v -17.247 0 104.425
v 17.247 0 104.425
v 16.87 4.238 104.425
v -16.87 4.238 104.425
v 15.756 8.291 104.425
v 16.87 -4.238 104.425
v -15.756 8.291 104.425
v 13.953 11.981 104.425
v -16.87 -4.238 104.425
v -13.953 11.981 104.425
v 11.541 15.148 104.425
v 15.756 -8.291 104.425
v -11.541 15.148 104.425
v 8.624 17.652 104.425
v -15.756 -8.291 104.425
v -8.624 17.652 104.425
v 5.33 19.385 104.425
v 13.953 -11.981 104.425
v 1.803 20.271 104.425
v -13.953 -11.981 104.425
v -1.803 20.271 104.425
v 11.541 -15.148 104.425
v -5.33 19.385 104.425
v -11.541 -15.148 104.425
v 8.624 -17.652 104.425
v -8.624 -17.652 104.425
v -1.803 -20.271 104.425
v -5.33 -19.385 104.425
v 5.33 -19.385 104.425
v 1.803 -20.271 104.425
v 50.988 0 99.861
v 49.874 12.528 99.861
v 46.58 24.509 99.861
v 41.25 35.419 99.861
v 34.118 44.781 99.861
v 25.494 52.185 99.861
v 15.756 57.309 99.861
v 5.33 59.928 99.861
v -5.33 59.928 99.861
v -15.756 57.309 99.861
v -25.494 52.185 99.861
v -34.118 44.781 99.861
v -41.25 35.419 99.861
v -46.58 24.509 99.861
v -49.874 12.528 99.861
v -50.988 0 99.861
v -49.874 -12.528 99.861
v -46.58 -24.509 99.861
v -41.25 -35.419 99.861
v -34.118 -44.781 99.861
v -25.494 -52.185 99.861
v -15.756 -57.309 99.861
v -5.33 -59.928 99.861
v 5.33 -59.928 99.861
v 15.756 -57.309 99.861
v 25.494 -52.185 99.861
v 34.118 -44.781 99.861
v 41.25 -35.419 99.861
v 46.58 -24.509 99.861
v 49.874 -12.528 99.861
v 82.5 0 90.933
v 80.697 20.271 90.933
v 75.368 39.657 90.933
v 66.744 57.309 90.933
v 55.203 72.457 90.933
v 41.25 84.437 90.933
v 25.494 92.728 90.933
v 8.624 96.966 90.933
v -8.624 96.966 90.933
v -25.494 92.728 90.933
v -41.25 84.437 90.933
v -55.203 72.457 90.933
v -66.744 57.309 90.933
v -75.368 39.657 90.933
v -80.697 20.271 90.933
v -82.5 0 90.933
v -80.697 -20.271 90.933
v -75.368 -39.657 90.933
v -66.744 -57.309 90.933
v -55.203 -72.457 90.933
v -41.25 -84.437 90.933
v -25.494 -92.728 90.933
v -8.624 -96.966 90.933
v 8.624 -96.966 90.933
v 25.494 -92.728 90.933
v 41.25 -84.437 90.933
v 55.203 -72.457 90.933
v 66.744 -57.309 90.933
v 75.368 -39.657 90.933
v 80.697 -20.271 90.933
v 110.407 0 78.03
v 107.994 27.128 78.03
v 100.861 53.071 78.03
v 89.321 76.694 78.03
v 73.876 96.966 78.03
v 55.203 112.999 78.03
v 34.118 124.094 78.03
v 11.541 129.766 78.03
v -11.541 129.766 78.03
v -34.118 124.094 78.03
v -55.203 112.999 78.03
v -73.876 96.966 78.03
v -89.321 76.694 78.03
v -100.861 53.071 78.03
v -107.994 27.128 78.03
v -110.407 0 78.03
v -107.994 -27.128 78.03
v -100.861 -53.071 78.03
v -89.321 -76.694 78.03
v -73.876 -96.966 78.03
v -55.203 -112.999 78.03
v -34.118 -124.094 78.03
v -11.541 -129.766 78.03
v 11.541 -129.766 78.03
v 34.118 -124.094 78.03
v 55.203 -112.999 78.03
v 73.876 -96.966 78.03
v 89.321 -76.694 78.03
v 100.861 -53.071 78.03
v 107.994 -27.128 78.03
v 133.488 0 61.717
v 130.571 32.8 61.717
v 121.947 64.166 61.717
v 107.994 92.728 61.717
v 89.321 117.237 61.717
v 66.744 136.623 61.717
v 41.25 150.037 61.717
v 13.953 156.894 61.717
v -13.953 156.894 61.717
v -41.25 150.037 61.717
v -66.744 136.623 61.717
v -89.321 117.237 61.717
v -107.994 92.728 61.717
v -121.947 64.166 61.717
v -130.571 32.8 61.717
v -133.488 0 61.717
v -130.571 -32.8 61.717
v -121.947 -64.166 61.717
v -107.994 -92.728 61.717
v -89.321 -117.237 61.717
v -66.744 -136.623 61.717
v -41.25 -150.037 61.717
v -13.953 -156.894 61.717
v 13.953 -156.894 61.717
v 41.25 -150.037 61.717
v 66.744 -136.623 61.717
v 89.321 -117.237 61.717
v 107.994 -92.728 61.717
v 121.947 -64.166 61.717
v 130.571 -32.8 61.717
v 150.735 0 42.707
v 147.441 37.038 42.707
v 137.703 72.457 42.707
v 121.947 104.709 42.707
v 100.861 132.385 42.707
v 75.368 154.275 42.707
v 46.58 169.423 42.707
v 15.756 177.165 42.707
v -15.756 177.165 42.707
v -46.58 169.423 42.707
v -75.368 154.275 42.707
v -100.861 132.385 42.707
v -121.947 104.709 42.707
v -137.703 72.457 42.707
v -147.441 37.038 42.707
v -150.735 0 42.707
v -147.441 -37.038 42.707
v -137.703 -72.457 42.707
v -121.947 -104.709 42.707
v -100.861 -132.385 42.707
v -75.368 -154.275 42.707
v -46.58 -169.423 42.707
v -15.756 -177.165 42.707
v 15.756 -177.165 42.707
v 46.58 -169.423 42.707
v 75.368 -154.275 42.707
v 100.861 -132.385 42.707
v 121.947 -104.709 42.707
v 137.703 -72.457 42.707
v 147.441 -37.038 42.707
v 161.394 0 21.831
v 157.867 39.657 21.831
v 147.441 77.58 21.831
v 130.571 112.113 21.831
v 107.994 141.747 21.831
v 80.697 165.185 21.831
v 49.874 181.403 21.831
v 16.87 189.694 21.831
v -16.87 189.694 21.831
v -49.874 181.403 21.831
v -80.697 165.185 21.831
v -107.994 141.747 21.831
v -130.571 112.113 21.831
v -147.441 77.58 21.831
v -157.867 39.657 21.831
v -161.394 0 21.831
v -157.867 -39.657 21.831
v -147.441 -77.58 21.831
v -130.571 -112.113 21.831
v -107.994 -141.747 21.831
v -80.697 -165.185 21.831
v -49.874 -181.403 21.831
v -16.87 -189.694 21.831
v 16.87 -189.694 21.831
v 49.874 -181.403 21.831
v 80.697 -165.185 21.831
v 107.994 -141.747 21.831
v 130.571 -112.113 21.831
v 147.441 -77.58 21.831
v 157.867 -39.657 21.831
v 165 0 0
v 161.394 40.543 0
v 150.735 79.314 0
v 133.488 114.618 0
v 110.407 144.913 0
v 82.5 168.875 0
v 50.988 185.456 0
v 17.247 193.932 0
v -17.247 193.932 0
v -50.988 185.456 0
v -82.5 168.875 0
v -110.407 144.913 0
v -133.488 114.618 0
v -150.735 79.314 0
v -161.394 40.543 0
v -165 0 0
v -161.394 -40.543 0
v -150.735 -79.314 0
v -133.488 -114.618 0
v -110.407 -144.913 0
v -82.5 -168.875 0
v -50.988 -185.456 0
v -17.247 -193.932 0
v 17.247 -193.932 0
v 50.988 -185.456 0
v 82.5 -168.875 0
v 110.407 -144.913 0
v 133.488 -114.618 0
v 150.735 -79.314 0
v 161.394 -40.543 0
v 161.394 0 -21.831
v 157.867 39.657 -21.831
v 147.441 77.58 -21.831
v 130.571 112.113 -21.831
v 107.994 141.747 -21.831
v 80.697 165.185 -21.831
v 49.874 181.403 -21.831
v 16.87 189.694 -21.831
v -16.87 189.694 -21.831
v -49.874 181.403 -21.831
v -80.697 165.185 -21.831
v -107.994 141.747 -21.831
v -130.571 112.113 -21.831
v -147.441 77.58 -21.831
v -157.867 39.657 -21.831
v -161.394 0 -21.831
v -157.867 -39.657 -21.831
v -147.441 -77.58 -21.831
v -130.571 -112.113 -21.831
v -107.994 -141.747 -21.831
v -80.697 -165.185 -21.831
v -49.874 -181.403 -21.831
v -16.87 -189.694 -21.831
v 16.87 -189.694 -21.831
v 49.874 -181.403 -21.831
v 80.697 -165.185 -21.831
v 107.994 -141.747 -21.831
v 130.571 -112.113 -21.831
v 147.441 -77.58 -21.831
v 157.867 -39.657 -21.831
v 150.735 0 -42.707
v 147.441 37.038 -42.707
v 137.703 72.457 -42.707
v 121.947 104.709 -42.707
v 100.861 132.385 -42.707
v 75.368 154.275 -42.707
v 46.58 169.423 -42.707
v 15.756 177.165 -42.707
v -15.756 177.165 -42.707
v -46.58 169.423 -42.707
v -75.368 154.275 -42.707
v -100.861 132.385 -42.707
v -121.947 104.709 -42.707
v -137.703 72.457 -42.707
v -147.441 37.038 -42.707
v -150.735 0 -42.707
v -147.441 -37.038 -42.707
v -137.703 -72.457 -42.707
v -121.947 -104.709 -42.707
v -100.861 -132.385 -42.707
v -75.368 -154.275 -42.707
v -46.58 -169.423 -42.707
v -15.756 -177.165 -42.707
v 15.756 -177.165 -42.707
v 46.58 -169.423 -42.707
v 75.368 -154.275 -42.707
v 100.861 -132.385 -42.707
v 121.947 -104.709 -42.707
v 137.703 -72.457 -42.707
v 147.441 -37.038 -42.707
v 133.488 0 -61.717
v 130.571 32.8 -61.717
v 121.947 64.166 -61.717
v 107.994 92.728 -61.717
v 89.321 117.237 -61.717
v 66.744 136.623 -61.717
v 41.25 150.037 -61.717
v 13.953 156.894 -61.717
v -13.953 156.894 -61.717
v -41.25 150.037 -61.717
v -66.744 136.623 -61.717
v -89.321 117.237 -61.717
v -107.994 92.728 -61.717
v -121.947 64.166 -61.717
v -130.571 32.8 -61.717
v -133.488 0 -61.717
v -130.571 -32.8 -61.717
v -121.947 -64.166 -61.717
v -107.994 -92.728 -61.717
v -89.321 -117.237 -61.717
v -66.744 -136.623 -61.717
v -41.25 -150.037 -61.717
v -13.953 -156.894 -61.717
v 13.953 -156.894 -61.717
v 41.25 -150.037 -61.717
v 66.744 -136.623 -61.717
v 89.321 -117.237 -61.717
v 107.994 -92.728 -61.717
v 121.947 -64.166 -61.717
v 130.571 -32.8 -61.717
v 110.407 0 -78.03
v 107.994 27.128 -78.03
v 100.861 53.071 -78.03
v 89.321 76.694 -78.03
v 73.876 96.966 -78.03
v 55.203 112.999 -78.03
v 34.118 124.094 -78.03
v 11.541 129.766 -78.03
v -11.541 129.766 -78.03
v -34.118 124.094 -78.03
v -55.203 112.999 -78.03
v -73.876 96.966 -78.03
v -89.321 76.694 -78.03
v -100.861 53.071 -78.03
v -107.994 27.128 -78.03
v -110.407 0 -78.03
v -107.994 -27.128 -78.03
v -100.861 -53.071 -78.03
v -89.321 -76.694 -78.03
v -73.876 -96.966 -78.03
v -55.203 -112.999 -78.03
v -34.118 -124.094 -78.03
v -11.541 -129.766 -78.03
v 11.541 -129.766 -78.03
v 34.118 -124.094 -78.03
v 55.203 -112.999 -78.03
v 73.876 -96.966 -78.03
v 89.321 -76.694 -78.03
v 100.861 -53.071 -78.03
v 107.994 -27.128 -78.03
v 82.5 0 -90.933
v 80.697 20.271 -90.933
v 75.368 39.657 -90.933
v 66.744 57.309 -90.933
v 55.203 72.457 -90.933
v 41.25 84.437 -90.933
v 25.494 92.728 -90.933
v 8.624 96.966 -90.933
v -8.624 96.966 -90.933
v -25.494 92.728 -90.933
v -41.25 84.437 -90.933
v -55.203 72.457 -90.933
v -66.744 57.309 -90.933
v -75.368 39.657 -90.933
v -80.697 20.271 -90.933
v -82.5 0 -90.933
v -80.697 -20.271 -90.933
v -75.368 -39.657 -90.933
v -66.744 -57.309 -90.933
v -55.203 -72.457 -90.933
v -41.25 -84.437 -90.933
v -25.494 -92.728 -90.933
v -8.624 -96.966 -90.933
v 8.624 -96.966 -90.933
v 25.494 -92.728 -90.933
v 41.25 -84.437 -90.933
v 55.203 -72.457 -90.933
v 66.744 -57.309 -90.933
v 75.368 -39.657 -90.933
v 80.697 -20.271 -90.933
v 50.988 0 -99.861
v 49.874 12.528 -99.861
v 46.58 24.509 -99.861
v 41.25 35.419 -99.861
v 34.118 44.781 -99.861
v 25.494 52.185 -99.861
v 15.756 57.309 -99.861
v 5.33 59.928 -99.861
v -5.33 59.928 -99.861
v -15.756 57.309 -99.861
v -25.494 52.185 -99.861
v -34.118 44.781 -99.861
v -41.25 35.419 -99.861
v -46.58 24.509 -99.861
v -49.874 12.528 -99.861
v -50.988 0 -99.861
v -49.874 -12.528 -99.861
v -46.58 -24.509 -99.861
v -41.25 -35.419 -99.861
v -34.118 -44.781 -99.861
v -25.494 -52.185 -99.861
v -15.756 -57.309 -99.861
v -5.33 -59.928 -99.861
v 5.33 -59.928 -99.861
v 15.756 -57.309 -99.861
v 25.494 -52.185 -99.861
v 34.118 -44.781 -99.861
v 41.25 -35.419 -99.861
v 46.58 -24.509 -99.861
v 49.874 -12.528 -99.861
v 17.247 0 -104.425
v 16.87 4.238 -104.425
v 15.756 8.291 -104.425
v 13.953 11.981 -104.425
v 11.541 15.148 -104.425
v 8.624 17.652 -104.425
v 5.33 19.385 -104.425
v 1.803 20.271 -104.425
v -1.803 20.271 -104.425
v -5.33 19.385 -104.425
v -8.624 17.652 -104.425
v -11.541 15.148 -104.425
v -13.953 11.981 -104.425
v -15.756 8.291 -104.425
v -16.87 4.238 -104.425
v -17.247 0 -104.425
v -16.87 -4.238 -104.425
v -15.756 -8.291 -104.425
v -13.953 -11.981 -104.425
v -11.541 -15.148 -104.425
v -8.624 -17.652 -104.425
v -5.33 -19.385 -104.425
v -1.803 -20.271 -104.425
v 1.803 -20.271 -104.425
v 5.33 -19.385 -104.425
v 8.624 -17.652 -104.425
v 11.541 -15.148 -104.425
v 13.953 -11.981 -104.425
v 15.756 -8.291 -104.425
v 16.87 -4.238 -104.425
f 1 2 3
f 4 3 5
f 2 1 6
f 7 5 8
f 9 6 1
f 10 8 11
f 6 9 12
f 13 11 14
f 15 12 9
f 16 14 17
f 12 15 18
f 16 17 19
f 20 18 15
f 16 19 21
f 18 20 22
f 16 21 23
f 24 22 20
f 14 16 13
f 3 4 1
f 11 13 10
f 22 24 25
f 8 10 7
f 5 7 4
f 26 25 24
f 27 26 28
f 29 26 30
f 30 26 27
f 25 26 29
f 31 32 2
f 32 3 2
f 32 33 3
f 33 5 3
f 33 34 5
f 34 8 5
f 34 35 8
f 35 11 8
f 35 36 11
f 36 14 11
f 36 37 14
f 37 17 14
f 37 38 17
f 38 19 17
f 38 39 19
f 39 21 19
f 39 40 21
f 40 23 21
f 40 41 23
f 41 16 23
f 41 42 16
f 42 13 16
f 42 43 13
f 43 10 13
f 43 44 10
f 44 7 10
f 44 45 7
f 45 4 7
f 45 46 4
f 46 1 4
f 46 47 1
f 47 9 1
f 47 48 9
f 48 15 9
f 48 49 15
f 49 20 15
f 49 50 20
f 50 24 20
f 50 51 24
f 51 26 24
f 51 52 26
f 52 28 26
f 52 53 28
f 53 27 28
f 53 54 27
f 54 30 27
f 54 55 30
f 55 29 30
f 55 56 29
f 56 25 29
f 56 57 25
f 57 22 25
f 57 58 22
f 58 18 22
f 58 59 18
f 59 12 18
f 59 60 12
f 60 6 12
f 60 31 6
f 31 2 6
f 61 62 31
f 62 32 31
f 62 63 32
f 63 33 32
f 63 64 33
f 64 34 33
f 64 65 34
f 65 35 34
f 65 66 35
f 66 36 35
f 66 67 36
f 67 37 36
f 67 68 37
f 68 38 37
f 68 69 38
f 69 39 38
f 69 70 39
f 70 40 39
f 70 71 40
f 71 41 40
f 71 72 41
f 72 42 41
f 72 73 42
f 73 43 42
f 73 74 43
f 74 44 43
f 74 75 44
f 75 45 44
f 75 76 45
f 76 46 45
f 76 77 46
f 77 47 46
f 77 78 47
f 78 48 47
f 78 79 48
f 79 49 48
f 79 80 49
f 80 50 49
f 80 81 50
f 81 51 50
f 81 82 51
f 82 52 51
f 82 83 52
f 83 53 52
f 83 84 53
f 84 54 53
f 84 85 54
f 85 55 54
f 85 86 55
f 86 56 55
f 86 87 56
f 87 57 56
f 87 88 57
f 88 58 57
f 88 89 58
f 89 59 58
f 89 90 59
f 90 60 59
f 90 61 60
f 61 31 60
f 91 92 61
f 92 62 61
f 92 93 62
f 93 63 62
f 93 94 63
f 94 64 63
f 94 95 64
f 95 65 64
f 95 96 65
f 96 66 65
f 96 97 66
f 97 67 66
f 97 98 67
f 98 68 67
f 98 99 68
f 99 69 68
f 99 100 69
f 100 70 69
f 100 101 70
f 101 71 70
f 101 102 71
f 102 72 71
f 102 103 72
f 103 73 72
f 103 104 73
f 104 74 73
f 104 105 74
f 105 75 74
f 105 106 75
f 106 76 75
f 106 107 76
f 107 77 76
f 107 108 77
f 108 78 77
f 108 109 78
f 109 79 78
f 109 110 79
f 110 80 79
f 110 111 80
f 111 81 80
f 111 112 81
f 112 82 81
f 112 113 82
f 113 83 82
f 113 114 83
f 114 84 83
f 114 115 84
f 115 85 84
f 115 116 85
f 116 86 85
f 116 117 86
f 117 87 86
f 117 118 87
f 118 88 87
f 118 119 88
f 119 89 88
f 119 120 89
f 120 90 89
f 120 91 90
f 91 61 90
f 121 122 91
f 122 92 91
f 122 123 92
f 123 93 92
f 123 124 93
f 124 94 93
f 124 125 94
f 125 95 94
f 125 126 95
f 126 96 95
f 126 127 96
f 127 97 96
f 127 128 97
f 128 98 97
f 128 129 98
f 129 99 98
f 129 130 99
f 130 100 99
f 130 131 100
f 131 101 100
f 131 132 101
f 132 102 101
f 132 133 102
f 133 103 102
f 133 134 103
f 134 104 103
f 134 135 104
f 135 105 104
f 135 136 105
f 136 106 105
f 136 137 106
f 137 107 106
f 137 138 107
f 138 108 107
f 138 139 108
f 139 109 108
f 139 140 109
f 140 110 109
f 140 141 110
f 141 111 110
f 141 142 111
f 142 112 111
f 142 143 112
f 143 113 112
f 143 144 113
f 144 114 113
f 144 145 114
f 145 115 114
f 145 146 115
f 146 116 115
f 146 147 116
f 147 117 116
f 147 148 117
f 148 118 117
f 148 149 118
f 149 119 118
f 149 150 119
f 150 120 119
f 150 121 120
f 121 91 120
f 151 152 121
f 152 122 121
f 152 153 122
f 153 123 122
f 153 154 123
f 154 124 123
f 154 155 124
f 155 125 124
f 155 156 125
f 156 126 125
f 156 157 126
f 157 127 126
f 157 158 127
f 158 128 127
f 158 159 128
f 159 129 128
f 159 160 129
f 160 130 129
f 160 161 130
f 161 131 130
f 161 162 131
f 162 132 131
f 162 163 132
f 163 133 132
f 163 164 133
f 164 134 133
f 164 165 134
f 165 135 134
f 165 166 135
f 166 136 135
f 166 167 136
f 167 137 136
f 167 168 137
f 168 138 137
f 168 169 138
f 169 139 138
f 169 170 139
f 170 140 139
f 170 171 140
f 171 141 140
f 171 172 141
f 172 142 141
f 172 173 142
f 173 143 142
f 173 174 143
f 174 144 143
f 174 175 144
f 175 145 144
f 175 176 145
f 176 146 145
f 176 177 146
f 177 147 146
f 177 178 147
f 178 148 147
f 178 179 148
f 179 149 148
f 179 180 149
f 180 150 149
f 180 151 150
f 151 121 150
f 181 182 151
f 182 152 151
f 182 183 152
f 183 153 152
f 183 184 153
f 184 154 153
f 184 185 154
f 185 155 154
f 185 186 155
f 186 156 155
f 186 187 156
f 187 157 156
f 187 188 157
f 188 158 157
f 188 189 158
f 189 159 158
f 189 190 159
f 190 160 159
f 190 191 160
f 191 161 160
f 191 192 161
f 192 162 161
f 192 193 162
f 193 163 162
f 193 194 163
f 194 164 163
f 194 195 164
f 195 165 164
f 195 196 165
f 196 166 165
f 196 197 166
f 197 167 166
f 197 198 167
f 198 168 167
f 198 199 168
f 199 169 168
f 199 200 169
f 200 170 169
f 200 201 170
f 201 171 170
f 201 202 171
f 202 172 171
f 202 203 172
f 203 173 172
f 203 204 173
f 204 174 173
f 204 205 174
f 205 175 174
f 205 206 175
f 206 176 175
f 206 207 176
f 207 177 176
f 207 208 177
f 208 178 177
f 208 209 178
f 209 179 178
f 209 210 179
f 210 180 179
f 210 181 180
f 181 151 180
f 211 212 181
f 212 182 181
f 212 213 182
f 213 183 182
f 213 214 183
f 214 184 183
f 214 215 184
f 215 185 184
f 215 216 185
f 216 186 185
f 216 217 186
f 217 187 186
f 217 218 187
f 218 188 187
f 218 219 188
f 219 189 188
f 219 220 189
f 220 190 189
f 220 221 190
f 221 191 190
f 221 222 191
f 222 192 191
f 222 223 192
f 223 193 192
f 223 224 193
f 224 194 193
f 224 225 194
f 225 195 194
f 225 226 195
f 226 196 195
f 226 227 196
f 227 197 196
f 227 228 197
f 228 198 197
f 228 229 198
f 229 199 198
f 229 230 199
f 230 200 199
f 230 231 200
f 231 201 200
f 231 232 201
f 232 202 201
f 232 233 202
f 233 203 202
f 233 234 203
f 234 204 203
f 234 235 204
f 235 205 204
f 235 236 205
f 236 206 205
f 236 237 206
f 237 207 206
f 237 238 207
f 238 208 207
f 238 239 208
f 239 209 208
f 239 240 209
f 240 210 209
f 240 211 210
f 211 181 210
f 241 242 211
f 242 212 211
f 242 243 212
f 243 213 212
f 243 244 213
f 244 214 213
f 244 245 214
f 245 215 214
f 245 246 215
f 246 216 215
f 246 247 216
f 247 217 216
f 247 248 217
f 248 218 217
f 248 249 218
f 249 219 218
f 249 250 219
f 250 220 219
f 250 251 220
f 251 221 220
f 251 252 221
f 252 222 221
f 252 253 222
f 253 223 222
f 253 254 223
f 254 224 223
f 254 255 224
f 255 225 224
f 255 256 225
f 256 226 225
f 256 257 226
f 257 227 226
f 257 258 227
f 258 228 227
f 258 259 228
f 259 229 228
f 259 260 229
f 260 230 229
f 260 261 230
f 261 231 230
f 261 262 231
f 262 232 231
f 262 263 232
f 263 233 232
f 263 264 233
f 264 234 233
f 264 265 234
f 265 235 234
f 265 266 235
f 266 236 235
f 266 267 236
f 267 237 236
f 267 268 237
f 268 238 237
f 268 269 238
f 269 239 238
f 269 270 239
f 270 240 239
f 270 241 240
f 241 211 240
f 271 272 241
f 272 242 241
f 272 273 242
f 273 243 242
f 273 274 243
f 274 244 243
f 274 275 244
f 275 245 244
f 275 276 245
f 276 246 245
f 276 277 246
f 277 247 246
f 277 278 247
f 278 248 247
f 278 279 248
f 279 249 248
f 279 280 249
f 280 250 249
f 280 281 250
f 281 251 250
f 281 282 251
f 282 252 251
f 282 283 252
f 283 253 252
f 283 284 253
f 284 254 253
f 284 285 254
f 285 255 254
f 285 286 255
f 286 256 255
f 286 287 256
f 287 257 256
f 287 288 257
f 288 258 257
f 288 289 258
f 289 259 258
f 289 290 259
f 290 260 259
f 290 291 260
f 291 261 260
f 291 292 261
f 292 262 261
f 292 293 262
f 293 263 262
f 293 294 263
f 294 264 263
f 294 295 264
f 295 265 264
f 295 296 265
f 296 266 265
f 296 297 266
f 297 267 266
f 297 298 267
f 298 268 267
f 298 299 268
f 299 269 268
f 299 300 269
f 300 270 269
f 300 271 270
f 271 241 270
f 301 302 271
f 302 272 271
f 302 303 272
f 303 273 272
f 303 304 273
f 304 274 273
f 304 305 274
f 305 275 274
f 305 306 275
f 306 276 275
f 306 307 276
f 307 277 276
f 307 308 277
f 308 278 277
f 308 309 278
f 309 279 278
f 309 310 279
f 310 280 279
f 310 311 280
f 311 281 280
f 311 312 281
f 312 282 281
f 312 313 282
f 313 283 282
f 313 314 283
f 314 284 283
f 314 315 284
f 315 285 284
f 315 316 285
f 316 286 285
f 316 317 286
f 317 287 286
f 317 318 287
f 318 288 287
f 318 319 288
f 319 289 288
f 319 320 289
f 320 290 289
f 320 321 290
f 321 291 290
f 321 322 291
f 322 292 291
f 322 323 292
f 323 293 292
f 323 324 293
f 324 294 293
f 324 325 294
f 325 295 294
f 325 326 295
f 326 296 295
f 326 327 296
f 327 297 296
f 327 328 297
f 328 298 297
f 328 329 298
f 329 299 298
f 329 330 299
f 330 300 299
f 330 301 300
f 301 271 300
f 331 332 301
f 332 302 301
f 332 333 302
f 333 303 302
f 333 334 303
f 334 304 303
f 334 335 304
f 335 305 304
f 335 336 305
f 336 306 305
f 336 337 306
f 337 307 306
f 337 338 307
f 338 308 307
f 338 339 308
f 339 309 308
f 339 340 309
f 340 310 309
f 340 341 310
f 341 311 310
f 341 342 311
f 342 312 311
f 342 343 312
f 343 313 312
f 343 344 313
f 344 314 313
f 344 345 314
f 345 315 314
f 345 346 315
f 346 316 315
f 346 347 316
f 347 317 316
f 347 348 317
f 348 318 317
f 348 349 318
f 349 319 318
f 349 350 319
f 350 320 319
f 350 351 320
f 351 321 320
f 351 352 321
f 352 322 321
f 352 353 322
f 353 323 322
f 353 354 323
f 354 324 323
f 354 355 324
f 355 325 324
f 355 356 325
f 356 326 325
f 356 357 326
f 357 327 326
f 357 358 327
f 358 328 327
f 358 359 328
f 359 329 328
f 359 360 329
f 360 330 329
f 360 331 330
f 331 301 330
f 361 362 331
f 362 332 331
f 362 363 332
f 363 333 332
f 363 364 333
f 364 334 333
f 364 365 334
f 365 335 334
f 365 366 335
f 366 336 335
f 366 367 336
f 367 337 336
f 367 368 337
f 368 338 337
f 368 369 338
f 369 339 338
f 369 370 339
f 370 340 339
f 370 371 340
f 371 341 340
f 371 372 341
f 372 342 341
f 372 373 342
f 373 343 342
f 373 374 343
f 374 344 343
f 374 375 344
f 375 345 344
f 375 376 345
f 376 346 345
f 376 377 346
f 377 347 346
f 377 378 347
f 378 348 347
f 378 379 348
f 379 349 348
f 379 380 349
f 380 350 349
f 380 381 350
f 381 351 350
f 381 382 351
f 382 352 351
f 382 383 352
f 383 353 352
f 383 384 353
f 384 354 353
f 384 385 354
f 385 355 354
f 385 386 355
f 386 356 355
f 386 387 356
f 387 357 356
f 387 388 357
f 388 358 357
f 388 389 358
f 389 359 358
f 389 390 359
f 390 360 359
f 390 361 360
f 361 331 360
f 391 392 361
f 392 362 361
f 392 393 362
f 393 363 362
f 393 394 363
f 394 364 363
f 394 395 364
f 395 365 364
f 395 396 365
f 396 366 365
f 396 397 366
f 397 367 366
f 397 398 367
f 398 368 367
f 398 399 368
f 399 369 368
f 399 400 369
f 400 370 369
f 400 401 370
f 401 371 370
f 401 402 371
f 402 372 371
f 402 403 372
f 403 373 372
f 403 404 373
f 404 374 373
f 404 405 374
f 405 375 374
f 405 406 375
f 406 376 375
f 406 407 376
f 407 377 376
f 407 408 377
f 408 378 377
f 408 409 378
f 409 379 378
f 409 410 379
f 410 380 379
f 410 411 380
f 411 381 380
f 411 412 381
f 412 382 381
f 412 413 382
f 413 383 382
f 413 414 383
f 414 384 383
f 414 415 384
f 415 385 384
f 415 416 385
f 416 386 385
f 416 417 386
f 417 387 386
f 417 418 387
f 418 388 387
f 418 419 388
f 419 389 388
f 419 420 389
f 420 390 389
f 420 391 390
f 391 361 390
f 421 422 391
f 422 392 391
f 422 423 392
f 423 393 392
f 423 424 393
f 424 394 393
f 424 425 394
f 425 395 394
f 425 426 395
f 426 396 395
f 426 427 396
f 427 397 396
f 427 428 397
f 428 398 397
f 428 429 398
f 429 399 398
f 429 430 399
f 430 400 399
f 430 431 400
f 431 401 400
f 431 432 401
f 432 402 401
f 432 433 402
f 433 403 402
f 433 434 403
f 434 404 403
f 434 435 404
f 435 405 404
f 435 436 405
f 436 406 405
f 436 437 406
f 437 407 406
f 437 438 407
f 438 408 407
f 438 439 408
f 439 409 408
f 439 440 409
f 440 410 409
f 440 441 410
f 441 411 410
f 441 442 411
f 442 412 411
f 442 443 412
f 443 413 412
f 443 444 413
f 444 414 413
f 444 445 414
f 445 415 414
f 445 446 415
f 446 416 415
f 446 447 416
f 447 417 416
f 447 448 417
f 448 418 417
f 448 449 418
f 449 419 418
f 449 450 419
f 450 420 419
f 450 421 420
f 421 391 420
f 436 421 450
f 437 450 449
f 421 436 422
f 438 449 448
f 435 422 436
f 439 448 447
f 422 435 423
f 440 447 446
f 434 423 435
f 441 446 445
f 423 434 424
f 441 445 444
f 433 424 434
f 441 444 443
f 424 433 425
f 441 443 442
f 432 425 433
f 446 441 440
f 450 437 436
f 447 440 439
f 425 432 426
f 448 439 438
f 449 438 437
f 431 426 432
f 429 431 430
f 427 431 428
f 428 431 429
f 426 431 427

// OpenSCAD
// Generated by SolidPython 1.0.1 on 2020-07-29 00:46:49


scale(v = [11, 13, 7]) {
	sphere(r = 15);
}
/***********************************************
*********      SolidPython code:      **********
************************************************
 
# import packages: SolidPython
from solid import *
from solid.utils import *
from itertools import chain, combinations, permutations


class Resize:

    def __init__(self, scad_file):
        self.scad_file = scad_file
        #self.scad_file = import_scad(scad_file)
        # cone/cylinder param:
        self.r1 = 0
        self.r2 = 0
        self.h = 0
        # rectangular prism param:
        self.w = 0
        self.l = 0
        # ellipse param:
        self.r = 0

    # import OpenScad code (file name corresponds to shape)


    # classify shape + parameters
    def assign(self, param1, param2, param3):
        if self.scad_file == 'cone.scad':
            self.r1 = param1
            self.r2 = param2
            self.h = param3
        elif self.scad_file == 'cylinder.scad':
            self.r1 = param1
            self.r2 = param2
            self.h = param3
        elif self.scad_file == 'rectangularPrism.scad':
            self.h = param1
            self.l = param2
            self.w = param3
        else:
            self.r = param1
            self.h = param2

    # resize parameters
    def iterate(self):
        x = range(3, 20, 2)
        i = 1
        if self.scad_file == 'cone.scad':
            tempList = list(permutations(x, 2))
            for temp in tempList:
                param1 = temp[0]
                param2 = temp[1]
                filepath = 'produced_scad_files/' + 'cone' + str(param1) + '_' + str(param2) + '_' + '.scad'
                scad_render_to_file(cylinder(h=param1, r1=param2, r2=0), filepath)

        elif self.scad_file == 'cylinder.scad':
            tempList = list(permutations(x, 3))
            for temp in tempList:
                param1 = temp[0]
                param2 = temp[1]
                filepath = 'produced_scad_files/' + 'cylinder' + str(param1) + '_' + str(param2) + '_' + '.scad'
                scad_render_to_file(cylinder(h=param1, r1=param2, r2=param2), filepath)

        elif self.scad_file == 'rectangularPrism.scad':
            tempList = list(permutations(x, 3))
            for temp in tempList:
                param1 = temp[0]
                param2 = temp[1]
                param3 = temp[2]
                filepath = 'produced_scad_files/' + 'rectangularPrism' + str(param1) + '_' + str(param2) + '_' + str(
                    param3) + '.scad'
                scad_render_to_file(cube(size=(param1, param2, param3)), filepath)

        elif self.scad_file == 'ellipse.scad':
            tempList = list(permutations(x, 4))
            for temp in tempList:
                param1 = temp[0]
                param2 = temp[1]
                param3 = temp[2]
                param4 = temp[3]
                filepath = 'produced_scad_files/' + 'ellipse' + str(param1) + '_' + str(param2) + '_' + str(param3) + '_' + str(param4) + '.scad'
                scad_render_to_file(scale([param1, param2, param3])(sphere(r=param4)), filepath)

    def render_to_scadfile(self):
        scad_render_to_file(scad, 'example.scad') 
 
************************************************/
